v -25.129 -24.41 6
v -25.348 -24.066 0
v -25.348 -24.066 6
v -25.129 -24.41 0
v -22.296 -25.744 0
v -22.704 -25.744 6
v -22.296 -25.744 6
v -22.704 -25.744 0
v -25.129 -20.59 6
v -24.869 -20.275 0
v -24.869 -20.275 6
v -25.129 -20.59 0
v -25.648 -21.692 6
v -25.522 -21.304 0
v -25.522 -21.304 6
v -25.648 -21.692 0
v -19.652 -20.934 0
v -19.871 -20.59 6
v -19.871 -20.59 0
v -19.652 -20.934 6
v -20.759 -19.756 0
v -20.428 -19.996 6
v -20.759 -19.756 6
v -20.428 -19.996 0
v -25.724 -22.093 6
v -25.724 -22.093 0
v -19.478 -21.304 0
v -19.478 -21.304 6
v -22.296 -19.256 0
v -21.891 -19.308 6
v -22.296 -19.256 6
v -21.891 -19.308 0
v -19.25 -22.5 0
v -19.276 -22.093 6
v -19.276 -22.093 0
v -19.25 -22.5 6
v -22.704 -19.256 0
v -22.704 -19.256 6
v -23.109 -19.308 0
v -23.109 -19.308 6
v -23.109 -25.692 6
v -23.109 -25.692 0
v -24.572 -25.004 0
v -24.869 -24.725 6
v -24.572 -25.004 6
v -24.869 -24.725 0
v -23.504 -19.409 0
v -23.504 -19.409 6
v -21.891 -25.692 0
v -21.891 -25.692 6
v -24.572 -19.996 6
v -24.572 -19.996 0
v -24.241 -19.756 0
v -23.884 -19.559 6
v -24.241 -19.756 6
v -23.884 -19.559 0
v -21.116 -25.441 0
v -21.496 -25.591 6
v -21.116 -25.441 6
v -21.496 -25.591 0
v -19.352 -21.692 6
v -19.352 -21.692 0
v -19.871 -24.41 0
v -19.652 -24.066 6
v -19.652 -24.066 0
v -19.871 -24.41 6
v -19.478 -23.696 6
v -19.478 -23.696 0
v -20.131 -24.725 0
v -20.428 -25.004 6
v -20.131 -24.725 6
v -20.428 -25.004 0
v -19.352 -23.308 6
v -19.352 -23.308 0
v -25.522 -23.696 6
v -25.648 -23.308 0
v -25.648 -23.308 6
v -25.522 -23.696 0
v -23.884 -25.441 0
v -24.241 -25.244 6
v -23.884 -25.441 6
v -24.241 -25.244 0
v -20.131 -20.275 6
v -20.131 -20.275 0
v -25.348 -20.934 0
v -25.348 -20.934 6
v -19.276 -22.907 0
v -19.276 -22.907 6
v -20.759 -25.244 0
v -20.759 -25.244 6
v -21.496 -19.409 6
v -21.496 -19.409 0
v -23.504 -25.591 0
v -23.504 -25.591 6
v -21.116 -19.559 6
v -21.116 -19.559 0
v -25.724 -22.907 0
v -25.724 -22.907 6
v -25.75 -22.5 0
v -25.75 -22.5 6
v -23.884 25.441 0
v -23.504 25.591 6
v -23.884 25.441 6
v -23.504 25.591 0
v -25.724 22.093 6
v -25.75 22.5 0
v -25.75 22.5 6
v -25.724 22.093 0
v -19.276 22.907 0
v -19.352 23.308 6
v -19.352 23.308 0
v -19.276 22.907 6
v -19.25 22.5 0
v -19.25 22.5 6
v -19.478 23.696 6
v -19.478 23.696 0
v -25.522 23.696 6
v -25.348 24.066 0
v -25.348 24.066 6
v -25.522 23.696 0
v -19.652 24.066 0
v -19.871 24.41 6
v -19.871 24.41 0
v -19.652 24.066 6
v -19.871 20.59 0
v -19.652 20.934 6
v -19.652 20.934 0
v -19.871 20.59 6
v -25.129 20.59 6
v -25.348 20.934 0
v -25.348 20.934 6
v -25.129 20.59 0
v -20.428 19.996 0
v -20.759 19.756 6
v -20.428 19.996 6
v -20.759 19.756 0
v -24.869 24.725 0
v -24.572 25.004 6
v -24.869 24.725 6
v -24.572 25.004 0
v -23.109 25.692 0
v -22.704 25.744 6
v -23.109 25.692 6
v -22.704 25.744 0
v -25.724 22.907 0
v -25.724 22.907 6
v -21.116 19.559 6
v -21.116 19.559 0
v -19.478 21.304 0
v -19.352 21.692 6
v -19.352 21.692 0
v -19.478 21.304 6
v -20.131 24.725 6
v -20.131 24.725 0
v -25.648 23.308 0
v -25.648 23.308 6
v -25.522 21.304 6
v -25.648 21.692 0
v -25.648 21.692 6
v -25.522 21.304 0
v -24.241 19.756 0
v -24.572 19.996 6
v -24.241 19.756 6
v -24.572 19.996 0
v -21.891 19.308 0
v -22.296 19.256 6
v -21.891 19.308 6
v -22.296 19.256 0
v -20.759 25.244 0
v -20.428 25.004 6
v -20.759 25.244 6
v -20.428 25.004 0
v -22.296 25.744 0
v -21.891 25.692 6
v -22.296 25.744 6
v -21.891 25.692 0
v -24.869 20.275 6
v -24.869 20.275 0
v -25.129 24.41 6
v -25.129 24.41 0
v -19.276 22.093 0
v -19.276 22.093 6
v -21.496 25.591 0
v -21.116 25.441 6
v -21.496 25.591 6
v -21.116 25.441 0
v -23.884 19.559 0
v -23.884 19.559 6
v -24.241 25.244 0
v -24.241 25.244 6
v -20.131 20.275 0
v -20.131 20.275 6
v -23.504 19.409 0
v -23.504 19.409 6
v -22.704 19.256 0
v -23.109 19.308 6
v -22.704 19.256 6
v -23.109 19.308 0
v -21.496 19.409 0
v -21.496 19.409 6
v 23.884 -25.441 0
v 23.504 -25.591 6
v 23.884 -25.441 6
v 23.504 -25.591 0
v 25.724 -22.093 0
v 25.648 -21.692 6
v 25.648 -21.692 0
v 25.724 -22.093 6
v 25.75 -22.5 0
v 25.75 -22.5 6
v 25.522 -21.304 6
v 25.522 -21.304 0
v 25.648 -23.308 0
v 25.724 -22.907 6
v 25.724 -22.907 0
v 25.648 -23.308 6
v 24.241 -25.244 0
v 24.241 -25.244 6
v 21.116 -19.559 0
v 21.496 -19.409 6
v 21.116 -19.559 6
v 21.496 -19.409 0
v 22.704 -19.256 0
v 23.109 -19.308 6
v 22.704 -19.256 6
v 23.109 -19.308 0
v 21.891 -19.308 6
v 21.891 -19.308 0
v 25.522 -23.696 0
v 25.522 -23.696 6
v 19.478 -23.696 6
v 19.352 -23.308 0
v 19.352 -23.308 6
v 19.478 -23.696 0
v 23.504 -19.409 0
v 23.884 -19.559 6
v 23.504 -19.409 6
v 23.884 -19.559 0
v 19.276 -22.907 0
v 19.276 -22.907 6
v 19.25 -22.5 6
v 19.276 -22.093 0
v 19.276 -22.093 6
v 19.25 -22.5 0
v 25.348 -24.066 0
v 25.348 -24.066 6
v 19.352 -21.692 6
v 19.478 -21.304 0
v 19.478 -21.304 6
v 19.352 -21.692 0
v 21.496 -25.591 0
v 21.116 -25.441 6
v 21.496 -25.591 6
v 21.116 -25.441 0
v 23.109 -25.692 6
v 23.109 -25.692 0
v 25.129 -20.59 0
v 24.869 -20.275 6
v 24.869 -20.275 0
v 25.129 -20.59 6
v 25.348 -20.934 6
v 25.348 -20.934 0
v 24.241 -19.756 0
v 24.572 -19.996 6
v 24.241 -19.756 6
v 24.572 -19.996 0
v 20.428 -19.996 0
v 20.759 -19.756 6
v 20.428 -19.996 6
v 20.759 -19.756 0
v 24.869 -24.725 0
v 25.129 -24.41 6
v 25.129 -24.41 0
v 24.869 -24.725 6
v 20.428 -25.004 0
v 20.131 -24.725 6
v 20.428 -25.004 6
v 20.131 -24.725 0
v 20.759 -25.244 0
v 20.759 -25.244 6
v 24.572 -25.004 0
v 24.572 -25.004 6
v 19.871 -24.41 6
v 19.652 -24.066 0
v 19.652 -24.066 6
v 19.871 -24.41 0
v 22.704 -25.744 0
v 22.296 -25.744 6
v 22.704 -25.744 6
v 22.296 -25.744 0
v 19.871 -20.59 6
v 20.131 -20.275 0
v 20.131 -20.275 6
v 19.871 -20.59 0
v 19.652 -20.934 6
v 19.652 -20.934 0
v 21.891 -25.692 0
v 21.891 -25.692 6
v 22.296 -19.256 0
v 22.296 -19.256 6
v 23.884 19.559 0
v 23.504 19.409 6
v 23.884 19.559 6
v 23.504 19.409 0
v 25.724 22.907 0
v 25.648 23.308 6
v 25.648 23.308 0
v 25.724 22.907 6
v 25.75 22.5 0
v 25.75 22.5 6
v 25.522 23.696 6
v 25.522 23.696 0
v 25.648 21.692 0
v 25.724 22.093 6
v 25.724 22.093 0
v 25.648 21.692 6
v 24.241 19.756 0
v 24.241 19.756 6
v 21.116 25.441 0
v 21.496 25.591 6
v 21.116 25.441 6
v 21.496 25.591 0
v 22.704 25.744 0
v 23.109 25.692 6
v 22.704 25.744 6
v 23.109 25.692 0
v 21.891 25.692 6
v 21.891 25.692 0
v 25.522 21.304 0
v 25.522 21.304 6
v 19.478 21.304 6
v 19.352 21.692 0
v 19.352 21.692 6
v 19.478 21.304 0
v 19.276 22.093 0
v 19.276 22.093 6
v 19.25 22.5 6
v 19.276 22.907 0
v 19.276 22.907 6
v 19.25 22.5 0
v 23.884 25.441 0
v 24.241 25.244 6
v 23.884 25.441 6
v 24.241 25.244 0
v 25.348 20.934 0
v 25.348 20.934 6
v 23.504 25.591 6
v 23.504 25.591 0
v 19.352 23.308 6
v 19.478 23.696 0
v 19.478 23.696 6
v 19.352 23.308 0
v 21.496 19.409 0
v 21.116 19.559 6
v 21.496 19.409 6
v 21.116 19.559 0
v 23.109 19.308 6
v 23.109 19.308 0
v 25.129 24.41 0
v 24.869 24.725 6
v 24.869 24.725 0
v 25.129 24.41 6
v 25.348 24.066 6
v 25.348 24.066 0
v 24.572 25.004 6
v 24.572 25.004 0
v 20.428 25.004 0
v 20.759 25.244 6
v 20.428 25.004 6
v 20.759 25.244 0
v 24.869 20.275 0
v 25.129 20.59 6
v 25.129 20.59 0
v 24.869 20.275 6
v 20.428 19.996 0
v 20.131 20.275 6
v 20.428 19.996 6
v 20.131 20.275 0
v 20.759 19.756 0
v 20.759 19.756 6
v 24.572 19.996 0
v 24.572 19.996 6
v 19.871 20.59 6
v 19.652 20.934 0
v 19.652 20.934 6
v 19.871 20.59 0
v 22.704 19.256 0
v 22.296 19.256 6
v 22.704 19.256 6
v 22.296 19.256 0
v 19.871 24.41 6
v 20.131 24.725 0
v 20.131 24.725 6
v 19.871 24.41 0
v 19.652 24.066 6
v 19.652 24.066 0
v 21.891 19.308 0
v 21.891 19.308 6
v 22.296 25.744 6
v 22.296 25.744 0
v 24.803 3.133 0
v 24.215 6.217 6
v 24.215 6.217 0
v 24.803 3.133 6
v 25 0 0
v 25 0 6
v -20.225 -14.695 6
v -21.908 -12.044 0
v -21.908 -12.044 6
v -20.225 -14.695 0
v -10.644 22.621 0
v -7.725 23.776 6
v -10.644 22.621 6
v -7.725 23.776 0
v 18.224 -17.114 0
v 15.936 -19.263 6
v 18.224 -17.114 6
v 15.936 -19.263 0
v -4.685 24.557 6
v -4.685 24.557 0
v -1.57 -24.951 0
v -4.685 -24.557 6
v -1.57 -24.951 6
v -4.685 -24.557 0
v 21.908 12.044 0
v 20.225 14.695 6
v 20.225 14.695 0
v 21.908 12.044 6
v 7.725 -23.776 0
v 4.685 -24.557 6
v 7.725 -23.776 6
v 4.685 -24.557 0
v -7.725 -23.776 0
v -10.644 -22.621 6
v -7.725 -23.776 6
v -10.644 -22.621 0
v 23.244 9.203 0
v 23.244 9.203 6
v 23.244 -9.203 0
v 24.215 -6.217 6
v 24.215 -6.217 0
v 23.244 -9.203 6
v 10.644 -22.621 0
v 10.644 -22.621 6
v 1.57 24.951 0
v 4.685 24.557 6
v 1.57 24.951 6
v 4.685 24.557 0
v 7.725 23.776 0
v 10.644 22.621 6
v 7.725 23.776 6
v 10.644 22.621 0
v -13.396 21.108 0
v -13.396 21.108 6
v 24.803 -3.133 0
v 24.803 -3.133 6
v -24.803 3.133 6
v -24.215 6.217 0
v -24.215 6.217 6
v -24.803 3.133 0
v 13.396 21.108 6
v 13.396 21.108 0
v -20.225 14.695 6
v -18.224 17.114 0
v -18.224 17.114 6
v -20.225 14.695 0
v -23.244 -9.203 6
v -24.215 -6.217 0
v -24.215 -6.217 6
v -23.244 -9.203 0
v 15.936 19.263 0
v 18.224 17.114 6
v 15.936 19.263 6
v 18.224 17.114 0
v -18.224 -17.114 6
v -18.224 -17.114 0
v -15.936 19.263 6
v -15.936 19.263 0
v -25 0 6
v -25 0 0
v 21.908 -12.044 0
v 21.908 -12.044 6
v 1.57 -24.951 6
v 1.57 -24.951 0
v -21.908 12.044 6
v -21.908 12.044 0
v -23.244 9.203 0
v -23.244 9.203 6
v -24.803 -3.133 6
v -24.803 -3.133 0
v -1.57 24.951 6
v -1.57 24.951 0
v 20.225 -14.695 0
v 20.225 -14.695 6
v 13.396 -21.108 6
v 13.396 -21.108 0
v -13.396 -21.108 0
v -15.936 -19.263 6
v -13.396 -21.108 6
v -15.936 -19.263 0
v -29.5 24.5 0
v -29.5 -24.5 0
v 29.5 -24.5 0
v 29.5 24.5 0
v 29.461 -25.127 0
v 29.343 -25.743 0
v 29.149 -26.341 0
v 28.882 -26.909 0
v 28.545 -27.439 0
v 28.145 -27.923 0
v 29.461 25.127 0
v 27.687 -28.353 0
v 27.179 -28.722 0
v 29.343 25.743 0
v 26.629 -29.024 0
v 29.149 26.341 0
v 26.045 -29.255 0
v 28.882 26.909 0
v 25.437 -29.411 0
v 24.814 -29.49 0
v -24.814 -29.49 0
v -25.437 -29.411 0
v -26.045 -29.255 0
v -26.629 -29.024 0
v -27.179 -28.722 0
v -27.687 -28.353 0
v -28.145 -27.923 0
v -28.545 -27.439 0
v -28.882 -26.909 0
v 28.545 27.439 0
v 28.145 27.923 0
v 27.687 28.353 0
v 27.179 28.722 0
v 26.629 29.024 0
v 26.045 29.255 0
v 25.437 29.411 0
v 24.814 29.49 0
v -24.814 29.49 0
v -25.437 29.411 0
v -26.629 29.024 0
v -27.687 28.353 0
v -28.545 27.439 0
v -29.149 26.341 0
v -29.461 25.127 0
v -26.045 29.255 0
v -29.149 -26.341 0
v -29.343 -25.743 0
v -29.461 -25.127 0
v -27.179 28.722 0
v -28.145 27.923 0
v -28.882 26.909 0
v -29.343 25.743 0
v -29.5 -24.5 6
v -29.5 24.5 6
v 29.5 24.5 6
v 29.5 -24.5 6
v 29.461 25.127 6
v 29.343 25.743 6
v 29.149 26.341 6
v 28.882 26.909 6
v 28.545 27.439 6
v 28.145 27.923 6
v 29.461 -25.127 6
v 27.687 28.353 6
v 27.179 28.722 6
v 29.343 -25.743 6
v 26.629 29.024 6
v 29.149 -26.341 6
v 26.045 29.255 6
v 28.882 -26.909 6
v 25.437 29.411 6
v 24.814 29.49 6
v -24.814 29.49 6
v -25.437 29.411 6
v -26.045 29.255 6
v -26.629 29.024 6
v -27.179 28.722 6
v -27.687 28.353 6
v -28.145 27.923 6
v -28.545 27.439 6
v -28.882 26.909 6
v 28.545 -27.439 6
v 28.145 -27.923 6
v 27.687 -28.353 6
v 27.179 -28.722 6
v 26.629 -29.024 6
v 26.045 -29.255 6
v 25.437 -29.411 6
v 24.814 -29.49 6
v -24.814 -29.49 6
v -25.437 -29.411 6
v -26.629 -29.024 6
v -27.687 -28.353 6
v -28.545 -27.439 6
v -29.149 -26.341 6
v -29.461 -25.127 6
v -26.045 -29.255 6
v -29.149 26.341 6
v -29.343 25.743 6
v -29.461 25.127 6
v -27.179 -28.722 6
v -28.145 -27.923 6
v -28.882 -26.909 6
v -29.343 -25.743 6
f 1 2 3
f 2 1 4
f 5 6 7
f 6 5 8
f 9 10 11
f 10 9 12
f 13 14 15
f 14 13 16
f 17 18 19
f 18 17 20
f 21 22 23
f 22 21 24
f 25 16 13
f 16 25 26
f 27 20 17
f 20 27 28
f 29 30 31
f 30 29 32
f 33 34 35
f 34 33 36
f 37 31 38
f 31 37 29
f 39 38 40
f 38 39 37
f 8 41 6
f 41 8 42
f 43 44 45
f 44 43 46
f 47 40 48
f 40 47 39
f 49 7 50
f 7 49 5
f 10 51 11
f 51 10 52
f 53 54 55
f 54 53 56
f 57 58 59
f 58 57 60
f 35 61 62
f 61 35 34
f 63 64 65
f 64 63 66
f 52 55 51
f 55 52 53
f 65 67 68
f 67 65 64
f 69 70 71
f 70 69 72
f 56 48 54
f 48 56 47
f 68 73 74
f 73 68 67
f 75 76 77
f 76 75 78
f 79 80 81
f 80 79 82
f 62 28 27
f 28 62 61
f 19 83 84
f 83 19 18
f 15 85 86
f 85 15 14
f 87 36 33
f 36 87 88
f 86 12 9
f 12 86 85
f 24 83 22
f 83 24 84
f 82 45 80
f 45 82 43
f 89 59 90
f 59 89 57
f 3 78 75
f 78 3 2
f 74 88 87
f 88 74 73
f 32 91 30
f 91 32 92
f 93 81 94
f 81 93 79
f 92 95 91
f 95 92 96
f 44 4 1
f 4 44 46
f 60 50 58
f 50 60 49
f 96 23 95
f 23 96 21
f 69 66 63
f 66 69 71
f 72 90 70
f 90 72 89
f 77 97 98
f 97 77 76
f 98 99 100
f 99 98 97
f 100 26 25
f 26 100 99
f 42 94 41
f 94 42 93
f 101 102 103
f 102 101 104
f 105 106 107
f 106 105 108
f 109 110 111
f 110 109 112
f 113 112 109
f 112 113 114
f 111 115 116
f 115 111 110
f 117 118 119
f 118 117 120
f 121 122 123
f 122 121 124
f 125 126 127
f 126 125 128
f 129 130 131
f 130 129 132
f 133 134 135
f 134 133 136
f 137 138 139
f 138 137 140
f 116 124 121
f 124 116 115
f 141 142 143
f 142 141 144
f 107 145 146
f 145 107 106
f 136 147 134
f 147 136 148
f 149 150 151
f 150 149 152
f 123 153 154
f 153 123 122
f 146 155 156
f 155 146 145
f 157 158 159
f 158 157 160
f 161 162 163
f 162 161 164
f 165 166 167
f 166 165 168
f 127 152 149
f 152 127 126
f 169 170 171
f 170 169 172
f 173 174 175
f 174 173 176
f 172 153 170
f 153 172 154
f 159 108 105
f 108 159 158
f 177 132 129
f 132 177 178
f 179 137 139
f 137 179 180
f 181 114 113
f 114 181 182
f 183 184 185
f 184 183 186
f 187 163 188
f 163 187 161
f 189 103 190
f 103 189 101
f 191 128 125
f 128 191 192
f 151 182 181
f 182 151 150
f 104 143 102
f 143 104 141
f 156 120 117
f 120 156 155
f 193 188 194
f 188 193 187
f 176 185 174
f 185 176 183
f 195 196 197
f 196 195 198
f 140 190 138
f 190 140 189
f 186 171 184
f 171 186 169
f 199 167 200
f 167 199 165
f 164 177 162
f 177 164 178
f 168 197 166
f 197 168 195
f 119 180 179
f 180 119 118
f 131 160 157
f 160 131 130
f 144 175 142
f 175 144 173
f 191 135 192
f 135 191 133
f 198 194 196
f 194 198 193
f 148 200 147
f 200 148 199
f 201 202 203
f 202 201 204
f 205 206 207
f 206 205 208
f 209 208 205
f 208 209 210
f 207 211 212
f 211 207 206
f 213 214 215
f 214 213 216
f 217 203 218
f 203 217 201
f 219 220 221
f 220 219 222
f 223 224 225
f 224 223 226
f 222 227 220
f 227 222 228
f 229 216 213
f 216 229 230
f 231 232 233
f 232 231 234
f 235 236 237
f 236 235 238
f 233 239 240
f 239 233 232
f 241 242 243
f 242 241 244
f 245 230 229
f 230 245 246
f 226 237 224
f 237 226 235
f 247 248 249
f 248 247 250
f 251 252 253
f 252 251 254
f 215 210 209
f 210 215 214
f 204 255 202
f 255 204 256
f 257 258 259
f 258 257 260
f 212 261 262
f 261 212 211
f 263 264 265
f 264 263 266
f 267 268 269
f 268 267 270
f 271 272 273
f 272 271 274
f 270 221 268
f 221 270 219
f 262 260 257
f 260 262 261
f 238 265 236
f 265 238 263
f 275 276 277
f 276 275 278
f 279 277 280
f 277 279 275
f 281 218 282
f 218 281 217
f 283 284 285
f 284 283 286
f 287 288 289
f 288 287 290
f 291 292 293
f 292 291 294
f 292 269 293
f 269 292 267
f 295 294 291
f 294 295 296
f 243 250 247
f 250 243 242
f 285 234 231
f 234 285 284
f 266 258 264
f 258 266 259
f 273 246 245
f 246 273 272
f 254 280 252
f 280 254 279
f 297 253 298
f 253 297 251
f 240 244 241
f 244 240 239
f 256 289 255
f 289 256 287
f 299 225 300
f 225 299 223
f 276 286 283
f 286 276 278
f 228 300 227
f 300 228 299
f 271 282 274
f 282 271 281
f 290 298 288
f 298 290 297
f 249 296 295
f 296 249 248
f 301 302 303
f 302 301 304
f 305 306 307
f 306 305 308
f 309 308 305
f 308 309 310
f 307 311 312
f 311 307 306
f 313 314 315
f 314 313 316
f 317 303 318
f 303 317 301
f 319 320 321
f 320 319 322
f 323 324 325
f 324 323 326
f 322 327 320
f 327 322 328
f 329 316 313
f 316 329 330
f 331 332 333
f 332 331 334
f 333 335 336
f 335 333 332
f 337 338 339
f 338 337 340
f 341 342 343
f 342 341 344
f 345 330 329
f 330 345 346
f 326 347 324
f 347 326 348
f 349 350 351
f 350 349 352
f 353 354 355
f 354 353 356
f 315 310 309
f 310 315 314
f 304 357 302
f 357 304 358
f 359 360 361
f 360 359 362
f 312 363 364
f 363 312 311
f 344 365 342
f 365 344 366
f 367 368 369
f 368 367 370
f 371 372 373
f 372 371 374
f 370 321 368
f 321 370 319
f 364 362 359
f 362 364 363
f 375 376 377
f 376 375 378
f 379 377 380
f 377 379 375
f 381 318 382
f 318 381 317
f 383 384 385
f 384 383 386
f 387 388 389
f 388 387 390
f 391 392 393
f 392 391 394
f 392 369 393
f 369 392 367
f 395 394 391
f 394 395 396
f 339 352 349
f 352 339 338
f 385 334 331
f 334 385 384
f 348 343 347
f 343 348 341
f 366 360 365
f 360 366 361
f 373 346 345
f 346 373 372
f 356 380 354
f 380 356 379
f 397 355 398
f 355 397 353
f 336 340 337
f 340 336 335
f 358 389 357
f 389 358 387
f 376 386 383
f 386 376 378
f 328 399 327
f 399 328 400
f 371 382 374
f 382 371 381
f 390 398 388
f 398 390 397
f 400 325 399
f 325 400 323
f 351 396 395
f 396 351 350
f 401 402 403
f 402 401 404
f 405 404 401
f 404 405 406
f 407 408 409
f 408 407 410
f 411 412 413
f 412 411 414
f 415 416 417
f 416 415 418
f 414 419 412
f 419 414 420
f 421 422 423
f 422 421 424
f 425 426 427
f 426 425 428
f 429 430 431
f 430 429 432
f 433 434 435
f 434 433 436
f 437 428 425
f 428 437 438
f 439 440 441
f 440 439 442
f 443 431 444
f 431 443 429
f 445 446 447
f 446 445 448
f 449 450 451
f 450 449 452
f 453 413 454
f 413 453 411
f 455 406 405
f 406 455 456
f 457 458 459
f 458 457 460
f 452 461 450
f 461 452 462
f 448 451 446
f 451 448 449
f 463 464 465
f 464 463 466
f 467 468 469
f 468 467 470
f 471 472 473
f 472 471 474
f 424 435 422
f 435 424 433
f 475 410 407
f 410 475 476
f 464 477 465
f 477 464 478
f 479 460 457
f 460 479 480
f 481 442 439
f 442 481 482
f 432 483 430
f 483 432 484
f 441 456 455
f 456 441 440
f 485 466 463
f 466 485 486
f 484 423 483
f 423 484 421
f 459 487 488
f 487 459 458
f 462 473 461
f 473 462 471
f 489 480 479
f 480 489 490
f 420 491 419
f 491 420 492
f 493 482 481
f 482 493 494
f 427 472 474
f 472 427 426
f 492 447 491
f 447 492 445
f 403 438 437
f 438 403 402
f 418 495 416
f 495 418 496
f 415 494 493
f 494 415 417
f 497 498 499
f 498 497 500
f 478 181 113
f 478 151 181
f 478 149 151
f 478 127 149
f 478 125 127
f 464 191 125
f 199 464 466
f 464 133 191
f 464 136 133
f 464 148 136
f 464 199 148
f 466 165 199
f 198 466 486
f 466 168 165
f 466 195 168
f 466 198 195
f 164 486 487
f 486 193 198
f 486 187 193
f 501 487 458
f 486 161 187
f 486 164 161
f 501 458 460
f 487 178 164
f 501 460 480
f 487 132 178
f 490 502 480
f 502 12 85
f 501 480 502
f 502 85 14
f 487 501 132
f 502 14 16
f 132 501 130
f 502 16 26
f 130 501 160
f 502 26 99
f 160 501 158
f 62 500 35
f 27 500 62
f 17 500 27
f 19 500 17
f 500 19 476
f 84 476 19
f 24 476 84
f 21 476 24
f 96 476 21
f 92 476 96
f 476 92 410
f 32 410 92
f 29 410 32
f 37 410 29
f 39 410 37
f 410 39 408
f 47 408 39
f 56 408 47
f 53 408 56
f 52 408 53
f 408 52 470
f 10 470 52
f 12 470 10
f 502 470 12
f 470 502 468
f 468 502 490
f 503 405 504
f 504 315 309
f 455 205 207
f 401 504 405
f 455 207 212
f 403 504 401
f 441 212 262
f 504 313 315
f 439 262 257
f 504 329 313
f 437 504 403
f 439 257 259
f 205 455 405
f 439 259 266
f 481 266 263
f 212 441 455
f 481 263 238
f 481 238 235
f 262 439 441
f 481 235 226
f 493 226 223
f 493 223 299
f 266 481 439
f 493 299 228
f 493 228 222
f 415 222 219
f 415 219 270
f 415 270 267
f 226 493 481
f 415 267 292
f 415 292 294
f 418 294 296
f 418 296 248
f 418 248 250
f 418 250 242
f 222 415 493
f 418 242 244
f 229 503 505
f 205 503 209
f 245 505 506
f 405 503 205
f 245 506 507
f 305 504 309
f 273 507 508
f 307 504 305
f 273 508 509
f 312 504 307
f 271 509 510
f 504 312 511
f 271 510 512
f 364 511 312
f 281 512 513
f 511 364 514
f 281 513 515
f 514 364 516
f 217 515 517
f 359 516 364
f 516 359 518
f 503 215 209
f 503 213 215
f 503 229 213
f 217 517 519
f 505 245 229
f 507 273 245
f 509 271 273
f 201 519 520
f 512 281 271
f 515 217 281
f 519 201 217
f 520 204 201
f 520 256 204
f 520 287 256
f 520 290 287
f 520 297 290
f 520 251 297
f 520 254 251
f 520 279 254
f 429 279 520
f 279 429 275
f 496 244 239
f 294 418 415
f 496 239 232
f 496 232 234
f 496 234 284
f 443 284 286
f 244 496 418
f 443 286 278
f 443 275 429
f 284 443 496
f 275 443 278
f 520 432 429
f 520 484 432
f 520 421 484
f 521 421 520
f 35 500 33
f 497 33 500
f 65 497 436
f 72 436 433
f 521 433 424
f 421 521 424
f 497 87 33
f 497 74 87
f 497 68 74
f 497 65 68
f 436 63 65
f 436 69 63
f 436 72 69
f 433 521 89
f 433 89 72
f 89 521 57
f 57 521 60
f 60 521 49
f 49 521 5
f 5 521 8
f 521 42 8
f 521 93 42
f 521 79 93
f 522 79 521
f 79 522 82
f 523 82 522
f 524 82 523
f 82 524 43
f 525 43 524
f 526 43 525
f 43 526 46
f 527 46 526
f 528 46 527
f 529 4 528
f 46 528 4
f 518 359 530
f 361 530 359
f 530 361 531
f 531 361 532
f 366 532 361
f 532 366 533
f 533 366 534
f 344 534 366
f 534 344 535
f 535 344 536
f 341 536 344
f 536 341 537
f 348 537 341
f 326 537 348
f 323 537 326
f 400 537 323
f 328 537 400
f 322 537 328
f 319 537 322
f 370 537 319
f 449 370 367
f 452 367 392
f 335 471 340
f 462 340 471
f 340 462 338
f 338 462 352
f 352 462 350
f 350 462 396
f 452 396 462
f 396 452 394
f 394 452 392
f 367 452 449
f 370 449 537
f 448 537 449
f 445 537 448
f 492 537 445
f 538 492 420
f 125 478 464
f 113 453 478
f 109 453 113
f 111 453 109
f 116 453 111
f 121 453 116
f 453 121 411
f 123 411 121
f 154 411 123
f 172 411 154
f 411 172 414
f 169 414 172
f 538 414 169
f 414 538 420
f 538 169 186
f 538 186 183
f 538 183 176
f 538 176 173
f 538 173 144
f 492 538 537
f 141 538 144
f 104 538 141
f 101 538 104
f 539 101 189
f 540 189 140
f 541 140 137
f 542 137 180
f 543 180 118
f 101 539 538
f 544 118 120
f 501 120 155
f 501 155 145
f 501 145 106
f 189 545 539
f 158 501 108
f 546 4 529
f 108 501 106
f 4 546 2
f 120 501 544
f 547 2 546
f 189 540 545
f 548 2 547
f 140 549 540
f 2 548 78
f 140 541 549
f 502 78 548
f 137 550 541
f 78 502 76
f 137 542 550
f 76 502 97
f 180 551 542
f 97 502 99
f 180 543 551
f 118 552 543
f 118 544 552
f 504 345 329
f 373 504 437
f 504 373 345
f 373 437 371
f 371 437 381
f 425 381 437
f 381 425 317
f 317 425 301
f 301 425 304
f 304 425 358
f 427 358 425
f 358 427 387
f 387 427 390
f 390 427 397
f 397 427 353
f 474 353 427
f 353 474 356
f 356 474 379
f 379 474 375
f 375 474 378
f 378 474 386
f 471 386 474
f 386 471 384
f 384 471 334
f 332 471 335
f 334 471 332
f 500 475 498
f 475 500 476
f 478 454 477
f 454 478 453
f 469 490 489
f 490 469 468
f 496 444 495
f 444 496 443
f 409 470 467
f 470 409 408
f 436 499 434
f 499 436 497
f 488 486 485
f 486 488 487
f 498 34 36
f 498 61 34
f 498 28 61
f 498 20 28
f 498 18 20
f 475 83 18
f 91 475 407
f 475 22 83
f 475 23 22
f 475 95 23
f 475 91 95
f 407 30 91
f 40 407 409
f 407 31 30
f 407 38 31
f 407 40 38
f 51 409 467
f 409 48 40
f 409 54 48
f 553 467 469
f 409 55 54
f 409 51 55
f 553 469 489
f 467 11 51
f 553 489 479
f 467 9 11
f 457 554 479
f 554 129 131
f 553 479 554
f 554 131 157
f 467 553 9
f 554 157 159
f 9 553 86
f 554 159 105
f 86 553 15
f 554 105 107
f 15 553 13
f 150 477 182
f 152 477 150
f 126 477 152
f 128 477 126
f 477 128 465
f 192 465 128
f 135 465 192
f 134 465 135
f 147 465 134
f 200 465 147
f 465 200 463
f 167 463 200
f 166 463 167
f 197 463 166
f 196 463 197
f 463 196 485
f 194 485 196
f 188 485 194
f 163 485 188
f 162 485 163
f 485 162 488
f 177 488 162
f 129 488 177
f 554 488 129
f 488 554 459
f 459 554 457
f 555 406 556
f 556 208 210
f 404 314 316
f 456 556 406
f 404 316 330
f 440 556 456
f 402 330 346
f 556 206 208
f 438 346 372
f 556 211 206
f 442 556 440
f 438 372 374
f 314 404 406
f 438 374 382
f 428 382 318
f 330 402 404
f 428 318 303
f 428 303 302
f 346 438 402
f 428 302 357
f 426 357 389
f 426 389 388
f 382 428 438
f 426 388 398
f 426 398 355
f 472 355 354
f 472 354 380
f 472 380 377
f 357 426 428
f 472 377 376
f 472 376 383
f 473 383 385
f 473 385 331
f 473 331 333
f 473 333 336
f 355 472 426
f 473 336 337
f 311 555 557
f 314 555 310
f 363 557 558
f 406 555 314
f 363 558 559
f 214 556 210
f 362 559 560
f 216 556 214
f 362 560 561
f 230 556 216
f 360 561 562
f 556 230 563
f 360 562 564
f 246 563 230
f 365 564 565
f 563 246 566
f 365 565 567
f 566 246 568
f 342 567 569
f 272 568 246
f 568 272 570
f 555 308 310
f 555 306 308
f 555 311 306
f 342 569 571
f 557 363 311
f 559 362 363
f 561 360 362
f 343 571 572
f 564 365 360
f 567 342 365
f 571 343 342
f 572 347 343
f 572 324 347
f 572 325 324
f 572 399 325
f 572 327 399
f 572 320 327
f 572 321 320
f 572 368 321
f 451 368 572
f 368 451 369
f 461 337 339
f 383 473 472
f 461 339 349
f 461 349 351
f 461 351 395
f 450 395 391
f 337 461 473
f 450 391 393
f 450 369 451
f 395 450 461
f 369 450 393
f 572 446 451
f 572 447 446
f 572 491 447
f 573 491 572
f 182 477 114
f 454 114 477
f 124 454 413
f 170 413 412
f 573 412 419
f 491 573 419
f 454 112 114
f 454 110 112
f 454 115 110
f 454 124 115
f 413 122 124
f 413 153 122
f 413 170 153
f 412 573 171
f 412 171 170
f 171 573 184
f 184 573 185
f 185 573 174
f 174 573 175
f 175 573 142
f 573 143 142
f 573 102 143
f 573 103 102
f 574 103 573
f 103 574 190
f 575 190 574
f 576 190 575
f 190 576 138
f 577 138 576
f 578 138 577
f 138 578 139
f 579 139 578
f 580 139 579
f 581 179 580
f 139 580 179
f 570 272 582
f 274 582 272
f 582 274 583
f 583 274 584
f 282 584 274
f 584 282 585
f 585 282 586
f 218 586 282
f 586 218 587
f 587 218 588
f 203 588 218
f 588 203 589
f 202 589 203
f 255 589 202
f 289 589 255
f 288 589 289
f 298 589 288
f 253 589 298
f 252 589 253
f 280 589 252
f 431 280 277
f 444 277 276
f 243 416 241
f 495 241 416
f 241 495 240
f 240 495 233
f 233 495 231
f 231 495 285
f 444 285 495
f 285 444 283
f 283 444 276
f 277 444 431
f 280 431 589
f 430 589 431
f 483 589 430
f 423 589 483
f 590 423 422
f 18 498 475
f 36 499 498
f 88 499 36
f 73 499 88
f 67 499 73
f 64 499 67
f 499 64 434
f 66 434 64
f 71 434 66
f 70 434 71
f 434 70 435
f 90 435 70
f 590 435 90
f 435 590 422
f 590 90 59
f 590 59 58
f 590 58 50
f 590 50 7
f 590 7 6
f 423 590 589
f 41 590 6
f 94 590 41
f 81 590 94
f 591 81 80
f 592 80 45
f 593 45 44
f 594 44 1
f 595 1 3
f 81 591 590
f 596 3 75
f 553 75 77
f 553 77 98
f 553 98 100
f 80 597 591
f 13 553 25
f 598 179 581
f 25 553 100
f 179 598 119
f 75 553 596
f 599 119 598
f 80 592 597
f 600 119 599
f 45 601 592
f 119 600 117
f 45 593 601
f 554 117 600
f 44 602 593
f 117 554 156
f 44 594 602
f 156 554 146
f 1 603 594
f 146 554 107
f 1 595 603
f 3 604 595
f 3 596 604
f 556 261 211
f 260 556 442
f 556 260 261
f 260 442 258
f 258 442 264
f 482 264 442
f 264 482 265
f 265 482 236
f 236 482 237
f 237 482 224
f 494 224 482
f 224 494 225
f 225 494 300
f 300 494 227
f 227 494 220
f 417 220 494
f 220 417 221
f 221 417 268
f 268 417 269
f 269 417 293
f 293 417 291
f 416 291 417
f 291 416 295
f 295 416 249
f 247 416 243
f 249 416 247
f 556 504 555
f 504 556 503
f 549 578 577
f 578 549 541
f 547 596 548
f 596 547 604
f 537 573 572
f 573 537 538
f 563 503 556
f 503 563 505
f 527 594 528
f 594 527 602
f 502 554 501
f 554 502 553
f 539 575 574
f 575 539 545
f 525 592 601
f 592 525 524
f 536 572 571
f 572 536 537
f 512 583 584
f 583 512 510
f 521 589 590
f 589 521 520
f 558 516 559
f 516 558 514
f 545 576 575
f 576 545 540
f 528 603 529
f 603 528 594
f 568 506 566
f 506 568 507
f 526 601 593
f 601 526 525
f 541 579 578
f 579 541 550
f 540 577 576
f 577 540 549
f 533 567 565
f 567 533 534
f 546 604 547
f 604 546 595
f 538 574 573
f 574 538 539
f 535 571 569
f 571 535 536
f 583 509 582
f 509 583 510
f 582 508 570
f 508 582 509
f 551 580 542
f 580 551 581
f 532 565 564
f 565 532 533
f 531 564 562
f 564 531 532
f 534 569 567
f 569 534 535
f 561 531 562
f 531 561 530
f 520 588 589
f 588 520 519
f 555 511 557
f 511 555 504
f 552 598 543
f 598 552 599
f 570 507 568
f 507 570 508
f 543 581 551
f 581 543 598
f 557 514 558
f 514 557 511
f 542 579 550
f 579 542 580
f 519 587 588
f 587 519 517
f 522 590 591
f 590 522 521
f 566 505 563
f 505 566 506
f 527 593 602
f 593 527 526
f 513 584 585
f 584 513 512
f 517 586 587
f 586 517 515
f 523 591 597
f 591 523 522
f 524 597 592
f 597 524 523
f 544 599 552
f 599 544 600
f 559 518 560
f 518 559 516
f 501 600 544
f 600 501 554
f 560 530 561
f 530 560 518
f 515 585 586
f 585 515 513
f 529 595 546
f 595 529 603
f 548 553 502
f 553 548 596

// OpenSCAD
$fn = 50;


difference() {
	union() {
		hull() {
			translate(v = [-24.5000000000, 24.5000000000, 0]) {
				cylinder(h = 6, r = 5);
			}
			translate(v = [24.5000000000, 24.5000000000, 0]) {
				cylinder(h = 6, r = 5);
			}
			translate(v = [-24.5000000000, -24.5000000000, 0]) {
				cylinder(h = 6, r = 5);
			}
			translate(v = [24.5000000000, -24.5000000000, 0]) {
				cylinder(h = 6, r = 5);
			}
		}
	}
	union() {
		#translate(v = [-22.5000000000, -22.5000000000, -100.0000000000]) {
			cylinder(h = 200, r = 3.2500000000);
		}
		#translate(v = [-22.5000000000, 22.5000000000, -100.0000000000]) {
			cylinder(h = 200, r = 3.2500000000);
		}
		#translate(v = [22.5000000000, -22.5000000000, -100.0000000000]) {
			cylinder(h = 200, r = 3.2500000000);
		}
		#translate(v = [22.5000000000, 22.5000000000, -100.0000000000]) {
			cylinder(h = 200, r = 3.2500000000);
		}
		#cylinder(h = 6, r = 25.0000000000);
	}
}
